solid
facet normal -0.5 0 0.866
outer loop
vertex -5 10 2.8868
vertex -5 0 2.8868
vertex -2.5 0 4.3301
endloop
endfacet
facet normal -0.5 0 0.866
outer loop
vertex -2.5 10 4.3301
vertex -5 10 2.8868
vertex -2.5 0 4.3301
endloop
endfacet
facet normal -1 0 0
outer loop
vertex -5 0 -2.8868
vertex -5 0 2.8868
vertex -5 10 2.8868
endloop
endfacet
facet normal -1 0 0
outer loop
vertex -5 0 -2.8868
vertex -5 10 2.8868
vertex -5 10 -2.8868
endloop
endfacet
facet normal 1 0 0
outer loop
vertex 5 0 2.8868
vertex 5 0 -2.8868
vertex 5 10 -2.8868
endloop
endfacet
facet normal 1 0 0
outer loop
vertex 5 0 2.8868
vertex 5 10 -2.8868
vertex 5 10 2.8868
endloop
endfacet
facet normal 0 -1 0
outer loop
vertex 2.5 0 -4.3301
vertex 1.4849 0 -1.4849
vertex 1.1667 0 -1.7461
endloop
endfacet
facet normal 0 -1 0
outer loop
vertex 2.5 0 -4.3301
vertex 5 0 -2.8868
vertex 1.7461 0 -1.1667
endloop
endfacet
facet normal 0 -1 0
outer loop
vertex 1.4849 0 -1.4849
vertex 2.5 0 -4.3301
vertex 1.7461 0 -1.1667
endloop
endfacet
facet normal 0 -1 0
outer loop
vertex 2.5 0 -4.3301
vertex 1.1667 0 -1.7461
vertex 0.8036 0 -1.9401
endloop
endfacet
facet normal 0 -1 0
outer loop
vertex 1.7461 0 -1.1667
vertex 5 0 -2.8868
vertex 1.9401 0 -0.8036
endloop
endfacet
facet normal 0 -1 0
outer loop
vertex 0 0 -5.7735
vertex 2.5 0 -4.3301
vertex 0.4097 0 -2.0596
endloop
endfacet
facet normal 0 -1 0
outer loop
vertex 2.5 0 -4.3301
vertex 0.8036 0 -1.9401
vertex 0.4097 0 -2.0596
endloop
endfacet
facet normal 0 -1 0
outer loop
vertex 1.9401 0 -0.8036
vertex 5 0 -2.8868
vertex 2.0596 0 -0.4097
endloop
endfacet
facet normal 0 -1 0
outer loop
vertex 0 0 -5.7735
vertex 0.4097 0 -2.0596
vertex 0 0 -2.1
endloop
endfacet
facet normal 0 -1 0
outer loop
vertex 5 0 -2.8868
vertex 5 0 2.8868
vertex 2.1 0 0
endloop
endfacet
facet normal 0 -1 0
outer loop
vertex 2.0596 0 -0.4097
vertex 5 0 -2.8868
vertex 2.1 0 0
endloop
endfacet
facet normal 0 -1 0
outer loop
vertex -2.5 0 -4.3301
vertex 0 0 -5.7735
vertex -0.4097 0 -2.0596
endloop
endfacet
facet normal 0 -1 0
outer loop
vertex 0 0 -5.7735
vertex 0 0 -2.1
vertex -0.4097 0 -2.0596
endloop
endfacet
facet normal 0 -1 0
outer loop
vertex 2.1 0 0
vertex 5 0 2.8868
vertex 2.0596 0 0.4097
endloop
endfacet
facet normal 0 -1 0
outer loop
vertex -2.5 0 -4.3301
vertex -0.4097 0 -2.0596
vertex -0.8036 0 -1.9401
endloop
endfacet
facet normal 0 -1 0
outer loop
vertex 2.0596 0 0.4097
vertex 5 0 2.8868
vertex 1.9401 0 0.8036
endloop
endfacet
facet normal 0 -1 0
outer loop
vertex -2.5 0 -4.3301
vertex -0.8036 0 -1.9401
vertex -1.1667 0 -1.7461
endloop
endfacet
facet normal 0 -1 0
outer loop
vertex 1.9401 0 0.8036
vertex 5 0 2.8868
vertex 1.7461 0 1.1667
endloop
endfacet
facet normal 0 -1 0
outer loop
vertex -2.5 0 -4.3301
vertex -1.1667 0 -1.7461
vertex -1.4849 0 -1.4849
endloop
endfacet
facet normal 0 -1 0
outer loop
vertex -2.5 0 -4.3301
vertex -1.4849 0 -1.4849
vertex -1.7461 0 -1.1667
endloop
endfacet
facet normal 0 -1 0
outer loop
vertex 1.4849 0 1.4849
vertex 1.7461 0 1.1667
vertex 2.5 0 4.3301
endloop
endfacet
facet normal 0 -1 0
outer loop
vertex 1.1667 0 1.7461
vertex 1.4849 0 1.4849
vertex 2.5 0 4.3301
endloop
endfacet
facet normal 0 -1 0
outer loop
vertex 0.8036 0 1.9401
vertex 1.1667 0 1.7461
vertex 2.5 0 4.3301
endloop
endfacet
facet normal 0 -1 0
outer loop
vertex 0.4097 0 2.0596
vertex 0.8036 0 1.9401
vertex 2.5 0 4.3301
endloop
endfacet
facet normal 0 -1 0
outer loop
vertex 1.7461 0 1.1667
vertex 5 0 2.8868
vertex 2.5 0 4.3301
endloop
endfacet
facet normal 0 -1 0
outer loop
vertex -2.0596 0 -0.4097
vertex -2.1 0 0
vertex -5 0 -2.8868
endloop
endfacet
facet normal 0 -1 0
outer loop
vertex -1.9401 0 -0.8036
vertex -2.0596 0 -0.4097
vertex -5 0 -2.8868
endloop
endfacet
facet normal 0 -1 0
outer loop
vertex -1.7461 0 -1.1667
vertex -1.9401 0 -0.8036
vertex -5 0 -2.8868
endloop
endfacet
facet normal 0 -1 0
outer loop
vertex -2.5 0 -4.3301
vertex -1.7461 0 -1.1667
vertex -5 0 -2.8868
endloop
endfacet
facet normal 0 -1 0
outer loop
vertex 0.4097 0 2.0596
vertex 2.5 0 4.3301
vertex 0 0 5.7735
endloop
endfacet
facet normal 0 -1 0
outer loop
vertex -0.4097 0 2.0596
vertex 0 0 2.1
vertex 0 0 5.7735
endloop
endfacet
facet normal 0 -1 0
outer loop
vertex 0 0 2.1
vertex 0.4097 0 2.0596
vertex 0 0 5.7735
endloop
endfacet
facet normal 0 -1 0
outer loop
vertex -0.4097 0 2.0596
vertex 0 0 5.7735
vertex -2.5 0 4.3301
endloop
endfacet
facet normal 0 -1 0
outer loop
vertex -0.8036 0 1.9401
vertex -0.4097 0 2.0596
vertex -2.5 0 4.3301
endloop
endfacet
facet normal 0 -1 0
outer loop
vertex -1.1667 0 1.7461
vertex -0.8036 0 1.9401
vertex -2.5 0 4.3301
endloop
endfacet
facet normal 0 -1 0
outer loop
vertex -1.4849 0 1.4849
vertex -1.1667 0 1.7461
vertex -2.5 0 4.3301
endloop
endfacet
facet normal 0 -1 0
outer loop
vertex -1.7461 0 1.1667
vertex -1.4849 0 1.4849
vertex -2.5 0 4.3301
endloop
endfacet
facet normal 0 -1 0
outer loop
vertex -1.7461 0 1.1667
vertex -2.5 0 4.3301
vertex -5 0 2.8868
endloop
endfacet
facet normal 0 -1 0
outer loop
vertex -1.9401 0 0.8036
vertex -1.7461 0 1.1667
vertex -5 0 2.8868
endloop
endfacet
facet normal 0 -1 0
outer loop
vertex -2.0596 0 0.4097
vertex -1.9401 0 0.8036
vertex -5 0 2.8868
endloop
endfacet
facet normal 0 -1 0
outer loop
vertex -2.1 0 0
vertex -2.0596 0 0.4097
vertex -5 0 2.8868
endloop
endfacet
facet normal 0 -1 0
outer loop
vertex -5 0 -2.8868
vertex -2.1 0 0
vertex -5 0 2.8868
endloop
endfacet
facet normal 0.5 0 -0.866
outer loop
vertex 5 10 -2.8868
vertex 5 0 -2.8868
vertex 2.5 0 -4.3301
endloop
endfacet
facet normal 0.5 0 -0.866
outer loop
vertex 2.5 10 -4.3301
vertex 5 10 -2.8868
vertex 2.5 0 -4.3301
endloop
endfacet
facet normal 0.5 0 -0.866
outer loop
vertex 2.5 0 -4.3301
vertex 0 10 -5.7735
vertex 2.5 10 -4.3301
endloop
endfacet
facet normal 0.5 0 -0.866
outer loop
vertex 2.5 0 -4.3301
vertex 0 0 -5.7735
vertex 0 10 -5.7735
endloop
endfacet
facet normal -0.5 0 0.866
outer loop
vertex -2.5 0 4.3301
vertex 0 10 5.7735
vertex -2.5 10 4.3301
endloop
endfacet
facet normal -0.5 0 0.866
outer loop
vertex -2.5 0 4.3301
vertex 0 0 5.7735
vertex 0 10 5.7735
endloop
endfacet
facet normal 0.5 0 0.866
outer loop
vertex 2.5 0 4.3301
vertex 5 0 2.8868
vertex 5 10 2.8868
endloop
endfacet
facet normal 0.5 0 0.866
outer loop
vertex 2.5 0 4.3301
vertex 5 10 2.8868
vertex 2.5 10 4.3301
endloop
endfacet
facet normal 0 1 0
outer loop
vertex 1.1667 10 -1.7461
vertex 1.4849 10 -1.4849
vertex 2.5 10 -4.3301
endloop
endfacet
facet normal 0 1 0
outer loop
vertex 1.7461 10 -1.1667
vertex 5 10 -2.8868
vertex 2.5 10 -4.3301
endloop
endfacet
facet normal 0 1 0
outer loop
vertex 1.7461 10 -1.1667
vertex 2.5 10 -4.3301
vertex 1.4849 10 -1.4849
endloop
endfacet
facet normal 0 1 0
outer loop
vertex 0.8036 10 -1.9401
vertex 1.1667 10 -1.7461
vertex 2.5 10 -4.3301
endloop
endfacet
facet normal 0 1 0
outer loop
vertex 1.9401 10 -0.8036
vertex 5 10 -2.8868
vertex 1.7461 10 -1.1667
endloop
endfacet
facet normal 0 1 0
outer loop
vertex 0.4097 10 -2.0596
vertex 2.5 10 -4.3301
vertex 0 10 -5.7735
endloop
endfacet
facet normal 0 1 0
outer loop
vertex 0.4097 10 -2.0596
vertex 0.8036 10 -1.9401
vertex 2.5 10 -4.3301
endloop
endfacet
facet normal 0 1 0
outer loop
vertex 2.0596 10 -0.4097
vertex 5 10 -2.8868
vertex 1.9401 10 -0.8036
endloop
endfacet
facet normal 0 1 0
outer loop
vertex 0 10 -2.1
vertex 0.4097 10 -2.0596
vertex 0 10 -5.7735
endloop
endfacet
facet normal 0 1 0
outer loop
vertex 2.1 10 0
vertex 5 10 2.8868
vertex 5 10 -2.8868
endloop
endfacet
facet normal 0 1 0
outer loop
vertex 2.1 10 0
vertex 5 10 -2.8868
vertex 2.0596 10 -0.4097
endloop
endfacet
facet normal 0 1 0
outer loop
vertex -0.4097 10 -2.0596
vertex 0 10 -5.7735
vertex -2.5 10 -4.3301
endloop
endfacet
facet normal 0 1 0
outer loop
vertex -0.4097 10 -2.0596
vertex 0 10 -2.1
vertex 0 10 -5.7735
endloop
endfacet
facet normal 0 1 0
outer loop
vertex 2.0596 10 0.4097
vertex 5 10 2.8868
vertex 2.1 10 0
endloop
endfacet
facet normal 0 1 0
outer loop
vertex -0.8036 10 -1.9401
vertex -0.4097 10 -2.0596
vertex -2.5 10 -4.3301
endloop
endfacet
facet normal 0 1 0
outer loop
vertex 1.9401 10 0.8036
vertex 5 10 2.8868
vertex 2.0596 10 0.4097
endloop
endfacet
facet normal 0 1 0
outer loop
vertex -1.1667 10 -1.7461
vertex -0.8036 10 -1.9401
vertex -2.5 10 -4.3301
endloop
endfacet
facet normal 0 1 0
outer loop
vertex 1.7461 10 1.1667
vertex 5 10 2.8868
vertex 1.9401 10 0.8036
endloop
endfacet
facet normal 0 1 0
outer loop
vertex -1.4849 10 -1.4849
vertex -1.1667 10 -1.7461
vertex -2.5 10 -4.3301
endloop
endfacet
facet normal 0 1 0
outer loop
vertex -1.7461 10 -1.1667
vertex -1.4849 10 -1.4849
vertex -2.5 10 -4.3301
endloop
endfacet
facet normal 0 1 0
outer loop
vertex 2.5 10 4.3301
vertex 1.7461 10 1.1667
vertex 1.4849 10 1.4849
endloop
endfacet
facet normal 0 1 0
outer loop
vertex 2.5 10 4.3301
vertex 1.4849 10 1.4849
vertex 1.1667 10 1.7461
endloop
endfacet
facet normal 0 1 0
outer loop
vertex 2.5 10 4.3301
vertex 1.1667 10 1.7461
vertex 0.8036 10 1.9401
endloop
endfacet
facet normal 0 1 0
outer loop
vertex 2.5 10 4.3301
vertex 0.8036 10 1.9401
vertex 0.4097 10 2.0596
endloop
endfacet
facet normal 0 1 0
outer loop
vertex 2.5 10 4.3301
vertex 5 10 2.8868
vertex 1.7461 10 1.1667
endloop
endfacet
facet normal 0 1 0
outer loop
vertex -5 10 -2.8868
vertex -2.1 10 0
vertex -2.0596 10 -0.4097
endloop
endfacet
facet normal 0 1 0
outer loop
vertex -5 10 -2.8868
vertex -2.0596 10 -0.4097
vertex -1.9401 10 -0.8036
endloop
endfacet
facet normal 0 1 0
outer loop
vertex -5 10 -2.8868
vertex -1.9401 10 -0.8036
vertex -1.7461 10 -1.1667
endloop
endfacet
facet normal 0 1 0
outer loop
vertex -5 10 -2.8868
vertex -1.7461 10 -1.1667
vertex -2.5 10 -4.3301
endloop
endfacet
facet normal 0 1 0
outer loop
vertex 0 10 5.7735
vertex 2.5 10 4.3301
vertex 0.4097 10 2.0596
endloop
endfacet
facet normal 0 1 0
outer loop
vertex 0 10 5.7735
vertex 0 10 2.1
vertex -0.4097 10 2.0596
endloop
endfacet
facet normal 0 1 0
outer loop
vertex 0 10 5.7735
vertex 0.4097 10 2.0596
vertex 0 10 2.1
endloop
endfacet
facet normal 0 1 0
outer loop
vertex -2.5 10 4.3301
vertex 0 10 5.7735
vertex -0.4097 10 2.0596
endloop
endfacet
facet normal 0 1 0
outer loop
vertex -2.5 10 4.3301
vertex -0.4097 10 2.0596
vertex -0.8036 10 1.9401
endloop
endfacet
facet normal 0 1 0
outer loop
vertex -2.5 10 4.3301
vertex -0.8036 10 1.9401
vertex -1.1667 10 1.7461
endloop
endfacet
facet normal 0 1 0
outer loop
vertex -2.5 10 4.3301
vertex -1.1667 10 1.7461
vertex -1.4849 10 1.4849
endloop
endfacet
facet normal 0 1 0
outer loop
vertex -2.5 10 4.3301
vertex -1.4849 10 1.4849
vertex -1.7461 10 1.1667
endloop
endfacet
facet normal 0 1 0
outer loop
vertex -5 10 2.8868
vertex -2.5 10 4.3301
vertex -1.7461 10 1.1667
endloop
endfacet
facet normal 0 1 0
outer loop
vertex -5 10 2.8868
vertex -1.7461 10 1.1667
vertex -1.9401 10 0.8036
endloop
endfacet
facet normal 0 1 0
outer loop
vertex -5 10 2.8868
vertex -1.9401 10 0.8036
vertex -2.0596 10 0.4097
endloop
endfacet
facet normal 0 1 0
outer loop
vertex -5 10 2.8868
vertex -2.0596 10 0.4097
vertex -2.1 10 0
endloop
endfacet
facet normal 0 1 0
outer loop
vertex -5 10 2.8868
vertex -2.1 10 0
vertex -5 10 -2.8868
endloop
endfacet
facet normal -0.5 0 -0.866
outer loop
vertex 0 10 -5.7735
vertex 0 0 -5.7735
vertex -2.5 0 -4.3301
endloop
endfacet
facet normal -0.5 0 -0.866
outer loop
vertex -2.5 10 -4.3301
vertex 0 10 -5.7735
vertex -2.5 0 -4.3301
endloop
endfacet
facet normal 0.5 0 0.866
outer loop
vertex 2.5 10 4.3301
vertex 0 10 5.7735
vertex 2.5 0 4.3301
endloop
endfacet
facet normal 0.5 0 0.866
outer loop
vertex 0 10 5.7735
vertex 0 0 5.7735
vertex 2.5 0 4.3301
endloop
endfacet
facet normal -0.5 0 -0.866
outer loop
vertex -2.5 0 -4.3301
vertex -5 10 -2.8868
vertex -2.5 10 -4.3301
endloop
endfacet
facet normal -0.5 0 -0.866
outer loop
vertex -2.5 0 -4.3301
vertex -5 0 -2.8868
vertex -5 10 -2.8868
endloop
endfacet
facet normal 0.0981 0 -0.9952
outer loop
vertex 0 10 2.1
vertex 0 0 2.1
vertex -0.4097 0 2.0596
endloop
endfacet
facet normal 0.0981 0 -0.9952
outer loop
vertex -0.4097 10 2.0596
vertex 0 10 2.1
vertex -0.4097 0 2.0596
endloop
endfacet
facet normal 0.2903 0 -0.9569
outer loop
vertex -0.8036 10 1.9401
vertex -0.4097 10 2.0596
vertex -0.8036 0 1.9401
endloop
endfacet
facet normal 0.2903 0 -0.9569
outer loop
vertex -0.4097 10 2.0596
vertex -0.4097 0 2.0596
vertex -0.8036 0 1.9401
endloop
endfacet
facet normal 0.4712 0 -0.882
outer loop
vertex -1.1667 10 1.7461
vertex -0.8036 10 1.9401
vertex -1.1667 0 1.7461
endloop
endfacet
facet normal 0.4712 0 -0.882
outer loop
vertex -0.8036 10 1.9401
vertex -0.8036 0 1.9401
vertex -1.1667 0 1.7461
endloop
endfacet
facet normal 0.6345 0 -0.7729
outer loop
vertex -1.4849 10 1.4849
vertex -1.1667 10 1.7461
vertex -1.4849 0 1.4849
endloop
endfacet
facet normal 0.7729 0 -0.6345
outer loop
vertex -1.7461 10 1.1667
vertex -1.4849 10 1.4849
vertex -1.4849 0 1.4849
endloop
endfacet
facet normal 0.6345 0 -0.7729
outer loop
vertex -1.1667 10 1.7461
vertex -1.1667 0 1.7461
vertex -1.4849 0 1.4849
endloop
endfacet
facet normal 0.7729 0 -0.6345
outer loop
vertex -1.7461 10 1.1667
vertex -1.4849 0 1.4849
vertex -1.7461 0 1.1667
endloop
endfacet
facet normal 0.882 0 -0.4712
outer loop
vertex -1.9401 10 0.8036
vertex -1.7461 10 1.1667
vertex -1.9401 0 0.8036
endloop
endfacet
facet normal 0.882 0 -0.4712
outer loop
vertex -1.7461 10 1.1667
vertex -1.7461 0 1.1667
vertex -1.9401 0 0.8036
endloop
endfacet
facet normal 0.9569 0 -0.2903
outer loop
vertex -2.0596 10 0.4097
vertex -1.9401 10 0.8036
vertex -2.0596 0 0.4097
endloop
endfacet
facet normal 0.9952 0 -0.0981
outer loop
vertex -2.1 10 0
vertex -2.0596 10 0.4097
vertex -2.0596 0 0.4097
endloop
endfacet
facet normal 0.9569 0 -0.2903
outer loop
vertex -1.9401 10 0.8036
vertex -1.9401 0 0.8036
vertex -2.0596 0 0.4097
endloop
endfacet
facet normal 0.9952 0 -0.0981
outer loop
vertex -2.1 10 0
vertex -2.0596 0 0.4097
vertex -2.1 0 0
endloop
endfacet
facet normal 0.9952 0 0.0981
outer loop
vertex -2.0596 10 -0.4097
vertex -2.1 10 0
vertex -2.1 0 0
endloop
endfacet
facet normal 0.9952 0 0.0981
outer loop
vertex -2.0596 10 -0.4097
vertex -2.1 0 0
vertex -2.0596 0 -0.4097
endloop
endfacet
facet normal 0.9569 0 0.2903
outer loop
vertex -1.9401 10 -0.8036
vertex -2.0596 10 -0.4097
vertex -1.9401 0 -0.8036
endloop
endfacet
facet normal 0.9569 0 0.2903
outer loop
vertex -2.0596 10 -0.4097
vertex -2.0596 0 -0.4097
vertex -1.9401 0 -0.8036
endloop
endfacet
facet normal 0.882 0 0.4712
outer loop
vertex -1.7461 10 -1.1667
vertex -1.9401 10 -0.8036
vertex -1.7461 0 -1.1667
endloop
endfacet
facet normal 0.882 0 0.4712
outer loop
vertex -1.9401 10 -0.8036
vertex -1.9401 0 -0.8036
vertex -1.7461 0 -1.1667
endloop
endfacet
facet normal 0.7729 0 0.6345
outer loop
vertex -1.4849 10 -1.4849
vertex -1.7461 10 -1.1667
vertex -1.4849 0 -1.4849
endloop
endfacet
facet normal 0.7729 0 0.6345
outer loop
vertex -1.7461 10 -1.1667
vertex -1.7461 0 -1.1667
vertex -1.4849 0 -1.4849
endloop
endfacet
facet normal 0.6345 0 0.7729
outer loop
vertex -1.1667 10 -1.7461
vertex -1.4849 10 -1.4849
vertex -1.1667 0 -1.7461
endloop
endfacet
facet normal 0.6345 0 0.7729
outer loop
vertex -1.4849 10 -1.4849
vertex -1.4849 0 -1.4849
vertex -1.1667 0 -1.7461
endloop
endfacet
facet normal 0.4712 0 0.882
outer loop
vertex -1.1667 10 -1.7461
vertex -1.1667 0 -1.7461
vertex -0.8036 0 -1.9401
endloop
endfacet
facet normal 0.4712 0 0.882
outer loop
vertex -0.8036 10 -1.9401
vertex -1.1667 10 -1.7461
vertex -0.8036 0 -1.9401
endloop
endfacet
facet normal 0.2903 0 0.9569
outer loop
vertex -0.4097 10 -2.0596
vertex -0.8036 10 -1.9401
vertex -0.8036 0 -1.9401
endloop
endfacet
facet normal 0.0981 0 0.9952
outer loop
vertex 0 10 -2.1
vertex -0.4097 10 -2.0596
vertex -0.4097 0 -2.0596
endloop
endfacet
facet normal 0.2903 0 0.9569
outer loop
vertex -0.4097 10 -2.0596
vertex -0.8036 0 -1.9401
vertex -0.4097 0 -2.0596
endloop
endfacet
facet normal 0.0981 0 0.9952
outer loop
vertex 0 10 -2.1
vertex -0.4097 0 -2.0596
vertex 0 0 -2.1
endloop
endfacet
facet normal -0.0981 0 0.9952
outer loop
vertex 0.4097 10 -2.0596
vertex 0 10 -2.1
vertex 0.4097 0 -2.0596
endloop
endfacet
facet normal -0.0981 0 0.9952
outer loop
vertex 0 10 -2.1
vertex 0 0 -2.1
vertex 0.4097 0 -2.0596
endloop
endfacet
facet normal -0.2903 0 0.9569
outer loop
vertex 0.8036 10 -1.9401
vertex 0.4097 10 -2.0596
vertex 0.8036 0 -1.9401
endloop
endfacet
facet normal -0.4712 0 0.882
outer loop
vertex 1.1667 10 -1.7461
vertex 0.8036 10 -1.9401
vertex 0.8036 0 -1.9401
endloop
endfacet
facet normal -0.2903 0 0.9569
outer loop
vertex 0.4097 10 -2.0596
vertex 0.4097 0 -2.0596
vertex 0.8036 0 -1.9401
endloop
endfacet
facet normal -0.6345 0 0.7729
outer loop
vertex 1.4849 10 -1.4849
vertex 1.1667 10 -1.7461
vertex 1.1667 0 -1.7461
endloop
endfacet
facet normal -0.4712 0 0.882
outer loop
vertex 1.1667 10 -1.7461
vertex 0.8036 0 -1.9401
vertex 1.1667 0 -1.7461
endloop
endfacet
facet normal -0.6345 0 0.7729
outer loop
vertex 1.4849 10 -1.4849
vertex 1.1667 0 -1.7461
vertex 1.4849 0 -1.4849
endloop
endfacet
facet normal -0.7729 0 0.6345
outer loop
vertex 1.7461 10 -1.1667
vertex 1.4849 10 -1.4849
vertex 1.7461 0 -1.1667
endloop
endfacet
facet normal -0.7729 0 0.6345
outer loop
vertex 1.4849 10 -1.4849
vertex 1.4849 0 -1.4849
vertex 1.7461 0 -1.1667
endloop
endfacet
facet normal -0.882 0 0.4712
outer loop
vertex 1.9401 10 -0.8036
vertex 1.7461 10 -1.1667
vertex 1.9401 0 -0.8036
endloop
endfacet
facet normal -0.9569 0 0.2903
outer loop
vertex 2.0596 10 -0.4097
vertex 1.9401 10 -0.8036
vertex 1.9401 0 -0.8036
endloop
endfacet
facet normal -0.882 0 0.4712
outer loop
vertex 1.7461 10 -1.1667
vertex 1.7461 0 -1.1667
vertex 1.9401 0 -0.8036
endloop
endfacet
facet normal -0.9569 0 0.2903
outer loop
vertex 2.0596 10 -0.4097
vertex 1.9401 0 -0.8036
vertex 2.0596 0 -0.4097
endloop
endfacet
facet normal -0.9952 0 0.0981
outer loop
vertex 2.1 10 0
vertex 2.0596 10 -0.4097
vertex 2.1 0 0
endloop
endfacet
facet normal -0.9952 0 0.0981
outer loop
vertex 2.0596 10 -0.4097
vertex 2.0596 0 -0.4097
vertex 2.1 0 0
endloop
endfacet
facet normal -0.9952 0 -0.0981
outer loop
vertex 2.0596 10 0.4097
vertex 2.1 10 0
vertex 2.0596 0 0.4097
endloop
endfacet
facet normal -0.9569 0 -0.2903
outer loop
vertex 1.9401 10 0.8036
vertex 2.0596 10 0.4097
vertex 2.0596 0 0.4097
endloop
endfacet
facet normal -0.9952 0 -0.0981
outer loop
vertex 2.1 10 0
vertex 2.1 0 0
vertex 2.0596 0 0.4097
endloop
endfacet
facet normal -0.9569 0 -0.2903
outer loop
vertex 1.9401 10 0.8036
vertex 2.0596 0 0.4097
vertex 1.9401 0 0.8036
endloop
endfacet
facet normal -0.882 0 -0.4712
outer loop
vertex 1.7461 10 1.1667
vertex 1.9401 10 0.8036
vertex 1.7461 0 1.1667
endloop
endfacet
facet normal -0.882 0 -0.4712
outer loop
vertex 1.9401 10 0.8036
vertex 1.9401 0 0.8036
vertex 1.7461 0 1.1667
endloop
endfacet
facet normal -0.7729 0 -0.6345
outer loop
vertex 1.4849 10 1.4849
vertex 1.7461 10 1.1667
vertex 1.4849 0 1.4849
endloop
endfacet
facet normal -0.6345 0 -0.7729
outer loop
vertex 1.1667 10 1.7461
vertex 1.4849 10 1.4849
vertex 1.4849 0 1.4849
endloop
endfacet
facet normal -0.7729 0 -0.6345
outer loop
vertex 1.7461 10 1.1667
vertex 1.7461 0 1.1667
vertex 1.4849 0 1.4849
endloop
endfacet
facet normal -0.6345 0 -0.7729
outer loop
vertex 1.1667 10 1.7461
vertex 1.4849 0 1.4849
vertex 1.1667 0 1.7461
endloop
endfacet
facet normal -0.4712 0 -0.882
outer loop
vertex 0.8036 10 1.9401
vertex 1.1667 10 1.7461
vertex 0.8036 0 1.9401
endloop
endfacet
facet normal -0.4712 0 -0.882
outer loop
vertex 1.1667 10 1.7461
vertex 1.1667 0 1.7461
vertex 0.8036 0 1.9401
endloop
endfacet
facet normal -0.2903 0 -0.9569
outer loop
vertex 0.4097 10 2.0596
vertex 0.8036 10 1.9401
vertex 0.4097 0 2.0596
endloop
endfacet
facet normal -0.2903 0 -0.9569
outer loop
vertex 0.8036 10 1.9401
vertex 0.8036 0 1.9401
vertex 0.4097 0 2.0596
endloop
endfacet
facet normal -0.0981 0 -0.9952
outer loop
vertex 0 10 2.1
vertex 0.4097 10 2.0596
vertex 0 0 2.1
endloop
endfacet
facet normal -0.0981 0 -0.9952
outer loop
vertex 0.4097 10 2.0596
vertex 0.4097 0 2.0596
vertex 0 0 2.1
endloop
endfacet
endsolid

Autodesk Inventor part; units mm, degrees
ref_plane "YZ Plane" through (0, 0, 0) normal (1, 0, 0) x (0, 1, 0)
ref_plane "XZ Plane" through (0, 0, 0) normal (0, 1, 0) x (-1, 0, 0)
ref_plane "XY Plane" through (0, 0, 0) normal (0, 0, 1) x (1, 0, 0)
sketch "スケッチ1" plane through (0, 0, 0) normal (0, 1, 0) x (-1, 0, 0)
  circle A0 centre (0, 0) radius 5.7735
  line L0 (0, 0) -> (5, -2.8868)
  line L1 (5, -2.8868) -> (5, 0)
  line L2 (0, 0) -> (5, 0)
  line L3 (5, 2.8868) -> (5, 0)
  line L4 (5, 2.8868) -> (2.5, 4.3301)
  line L5 (0, 5.7735) -> (2.5, 4.3301)
  line L6 (0, 5.7735) -> (-2.5, 4.3301)
  line L7 (-5, 2.8868) -> (-2.5, 4.3301)
  line L8 (-5, 2.8868) -> (-5, 0)
  line L9 (-5, -2.8868) -> (-5, 0)
  line L10 (-5, -2.8868) -> (-2.5, -4.3301)
  line L11 (0, -5.7735) -> (-2.5, -4.3301)
  line L12 (0, -5.7735) -> (2.5, -4.3301)
  line L13 (5, -2.8868) -> (2.5, -4.3301)
  dimension "d1" = 5
  dimension "d2" = 30
  dimension "d5" = 360
extrude "押し出し1" add sketch "スケッチ1" along normal blind 10 contours L3 L2 L0 L13 L12 L11 L10 L9 L8 L7 L6 L5 L4 | L0 L2 L1
sketch "スケッチ2" plane through (0, 10, 0) normal (0, 1, 0) x (1, 0, 0)
  point P0 (0, 0)
  point P1 (0, 0)
hole "穴1" at (0, 10, 0) direction (0, -1, 0) diameter 4.2 end through all
properties part number "basespacer1" material "アルミニウム 6061"
